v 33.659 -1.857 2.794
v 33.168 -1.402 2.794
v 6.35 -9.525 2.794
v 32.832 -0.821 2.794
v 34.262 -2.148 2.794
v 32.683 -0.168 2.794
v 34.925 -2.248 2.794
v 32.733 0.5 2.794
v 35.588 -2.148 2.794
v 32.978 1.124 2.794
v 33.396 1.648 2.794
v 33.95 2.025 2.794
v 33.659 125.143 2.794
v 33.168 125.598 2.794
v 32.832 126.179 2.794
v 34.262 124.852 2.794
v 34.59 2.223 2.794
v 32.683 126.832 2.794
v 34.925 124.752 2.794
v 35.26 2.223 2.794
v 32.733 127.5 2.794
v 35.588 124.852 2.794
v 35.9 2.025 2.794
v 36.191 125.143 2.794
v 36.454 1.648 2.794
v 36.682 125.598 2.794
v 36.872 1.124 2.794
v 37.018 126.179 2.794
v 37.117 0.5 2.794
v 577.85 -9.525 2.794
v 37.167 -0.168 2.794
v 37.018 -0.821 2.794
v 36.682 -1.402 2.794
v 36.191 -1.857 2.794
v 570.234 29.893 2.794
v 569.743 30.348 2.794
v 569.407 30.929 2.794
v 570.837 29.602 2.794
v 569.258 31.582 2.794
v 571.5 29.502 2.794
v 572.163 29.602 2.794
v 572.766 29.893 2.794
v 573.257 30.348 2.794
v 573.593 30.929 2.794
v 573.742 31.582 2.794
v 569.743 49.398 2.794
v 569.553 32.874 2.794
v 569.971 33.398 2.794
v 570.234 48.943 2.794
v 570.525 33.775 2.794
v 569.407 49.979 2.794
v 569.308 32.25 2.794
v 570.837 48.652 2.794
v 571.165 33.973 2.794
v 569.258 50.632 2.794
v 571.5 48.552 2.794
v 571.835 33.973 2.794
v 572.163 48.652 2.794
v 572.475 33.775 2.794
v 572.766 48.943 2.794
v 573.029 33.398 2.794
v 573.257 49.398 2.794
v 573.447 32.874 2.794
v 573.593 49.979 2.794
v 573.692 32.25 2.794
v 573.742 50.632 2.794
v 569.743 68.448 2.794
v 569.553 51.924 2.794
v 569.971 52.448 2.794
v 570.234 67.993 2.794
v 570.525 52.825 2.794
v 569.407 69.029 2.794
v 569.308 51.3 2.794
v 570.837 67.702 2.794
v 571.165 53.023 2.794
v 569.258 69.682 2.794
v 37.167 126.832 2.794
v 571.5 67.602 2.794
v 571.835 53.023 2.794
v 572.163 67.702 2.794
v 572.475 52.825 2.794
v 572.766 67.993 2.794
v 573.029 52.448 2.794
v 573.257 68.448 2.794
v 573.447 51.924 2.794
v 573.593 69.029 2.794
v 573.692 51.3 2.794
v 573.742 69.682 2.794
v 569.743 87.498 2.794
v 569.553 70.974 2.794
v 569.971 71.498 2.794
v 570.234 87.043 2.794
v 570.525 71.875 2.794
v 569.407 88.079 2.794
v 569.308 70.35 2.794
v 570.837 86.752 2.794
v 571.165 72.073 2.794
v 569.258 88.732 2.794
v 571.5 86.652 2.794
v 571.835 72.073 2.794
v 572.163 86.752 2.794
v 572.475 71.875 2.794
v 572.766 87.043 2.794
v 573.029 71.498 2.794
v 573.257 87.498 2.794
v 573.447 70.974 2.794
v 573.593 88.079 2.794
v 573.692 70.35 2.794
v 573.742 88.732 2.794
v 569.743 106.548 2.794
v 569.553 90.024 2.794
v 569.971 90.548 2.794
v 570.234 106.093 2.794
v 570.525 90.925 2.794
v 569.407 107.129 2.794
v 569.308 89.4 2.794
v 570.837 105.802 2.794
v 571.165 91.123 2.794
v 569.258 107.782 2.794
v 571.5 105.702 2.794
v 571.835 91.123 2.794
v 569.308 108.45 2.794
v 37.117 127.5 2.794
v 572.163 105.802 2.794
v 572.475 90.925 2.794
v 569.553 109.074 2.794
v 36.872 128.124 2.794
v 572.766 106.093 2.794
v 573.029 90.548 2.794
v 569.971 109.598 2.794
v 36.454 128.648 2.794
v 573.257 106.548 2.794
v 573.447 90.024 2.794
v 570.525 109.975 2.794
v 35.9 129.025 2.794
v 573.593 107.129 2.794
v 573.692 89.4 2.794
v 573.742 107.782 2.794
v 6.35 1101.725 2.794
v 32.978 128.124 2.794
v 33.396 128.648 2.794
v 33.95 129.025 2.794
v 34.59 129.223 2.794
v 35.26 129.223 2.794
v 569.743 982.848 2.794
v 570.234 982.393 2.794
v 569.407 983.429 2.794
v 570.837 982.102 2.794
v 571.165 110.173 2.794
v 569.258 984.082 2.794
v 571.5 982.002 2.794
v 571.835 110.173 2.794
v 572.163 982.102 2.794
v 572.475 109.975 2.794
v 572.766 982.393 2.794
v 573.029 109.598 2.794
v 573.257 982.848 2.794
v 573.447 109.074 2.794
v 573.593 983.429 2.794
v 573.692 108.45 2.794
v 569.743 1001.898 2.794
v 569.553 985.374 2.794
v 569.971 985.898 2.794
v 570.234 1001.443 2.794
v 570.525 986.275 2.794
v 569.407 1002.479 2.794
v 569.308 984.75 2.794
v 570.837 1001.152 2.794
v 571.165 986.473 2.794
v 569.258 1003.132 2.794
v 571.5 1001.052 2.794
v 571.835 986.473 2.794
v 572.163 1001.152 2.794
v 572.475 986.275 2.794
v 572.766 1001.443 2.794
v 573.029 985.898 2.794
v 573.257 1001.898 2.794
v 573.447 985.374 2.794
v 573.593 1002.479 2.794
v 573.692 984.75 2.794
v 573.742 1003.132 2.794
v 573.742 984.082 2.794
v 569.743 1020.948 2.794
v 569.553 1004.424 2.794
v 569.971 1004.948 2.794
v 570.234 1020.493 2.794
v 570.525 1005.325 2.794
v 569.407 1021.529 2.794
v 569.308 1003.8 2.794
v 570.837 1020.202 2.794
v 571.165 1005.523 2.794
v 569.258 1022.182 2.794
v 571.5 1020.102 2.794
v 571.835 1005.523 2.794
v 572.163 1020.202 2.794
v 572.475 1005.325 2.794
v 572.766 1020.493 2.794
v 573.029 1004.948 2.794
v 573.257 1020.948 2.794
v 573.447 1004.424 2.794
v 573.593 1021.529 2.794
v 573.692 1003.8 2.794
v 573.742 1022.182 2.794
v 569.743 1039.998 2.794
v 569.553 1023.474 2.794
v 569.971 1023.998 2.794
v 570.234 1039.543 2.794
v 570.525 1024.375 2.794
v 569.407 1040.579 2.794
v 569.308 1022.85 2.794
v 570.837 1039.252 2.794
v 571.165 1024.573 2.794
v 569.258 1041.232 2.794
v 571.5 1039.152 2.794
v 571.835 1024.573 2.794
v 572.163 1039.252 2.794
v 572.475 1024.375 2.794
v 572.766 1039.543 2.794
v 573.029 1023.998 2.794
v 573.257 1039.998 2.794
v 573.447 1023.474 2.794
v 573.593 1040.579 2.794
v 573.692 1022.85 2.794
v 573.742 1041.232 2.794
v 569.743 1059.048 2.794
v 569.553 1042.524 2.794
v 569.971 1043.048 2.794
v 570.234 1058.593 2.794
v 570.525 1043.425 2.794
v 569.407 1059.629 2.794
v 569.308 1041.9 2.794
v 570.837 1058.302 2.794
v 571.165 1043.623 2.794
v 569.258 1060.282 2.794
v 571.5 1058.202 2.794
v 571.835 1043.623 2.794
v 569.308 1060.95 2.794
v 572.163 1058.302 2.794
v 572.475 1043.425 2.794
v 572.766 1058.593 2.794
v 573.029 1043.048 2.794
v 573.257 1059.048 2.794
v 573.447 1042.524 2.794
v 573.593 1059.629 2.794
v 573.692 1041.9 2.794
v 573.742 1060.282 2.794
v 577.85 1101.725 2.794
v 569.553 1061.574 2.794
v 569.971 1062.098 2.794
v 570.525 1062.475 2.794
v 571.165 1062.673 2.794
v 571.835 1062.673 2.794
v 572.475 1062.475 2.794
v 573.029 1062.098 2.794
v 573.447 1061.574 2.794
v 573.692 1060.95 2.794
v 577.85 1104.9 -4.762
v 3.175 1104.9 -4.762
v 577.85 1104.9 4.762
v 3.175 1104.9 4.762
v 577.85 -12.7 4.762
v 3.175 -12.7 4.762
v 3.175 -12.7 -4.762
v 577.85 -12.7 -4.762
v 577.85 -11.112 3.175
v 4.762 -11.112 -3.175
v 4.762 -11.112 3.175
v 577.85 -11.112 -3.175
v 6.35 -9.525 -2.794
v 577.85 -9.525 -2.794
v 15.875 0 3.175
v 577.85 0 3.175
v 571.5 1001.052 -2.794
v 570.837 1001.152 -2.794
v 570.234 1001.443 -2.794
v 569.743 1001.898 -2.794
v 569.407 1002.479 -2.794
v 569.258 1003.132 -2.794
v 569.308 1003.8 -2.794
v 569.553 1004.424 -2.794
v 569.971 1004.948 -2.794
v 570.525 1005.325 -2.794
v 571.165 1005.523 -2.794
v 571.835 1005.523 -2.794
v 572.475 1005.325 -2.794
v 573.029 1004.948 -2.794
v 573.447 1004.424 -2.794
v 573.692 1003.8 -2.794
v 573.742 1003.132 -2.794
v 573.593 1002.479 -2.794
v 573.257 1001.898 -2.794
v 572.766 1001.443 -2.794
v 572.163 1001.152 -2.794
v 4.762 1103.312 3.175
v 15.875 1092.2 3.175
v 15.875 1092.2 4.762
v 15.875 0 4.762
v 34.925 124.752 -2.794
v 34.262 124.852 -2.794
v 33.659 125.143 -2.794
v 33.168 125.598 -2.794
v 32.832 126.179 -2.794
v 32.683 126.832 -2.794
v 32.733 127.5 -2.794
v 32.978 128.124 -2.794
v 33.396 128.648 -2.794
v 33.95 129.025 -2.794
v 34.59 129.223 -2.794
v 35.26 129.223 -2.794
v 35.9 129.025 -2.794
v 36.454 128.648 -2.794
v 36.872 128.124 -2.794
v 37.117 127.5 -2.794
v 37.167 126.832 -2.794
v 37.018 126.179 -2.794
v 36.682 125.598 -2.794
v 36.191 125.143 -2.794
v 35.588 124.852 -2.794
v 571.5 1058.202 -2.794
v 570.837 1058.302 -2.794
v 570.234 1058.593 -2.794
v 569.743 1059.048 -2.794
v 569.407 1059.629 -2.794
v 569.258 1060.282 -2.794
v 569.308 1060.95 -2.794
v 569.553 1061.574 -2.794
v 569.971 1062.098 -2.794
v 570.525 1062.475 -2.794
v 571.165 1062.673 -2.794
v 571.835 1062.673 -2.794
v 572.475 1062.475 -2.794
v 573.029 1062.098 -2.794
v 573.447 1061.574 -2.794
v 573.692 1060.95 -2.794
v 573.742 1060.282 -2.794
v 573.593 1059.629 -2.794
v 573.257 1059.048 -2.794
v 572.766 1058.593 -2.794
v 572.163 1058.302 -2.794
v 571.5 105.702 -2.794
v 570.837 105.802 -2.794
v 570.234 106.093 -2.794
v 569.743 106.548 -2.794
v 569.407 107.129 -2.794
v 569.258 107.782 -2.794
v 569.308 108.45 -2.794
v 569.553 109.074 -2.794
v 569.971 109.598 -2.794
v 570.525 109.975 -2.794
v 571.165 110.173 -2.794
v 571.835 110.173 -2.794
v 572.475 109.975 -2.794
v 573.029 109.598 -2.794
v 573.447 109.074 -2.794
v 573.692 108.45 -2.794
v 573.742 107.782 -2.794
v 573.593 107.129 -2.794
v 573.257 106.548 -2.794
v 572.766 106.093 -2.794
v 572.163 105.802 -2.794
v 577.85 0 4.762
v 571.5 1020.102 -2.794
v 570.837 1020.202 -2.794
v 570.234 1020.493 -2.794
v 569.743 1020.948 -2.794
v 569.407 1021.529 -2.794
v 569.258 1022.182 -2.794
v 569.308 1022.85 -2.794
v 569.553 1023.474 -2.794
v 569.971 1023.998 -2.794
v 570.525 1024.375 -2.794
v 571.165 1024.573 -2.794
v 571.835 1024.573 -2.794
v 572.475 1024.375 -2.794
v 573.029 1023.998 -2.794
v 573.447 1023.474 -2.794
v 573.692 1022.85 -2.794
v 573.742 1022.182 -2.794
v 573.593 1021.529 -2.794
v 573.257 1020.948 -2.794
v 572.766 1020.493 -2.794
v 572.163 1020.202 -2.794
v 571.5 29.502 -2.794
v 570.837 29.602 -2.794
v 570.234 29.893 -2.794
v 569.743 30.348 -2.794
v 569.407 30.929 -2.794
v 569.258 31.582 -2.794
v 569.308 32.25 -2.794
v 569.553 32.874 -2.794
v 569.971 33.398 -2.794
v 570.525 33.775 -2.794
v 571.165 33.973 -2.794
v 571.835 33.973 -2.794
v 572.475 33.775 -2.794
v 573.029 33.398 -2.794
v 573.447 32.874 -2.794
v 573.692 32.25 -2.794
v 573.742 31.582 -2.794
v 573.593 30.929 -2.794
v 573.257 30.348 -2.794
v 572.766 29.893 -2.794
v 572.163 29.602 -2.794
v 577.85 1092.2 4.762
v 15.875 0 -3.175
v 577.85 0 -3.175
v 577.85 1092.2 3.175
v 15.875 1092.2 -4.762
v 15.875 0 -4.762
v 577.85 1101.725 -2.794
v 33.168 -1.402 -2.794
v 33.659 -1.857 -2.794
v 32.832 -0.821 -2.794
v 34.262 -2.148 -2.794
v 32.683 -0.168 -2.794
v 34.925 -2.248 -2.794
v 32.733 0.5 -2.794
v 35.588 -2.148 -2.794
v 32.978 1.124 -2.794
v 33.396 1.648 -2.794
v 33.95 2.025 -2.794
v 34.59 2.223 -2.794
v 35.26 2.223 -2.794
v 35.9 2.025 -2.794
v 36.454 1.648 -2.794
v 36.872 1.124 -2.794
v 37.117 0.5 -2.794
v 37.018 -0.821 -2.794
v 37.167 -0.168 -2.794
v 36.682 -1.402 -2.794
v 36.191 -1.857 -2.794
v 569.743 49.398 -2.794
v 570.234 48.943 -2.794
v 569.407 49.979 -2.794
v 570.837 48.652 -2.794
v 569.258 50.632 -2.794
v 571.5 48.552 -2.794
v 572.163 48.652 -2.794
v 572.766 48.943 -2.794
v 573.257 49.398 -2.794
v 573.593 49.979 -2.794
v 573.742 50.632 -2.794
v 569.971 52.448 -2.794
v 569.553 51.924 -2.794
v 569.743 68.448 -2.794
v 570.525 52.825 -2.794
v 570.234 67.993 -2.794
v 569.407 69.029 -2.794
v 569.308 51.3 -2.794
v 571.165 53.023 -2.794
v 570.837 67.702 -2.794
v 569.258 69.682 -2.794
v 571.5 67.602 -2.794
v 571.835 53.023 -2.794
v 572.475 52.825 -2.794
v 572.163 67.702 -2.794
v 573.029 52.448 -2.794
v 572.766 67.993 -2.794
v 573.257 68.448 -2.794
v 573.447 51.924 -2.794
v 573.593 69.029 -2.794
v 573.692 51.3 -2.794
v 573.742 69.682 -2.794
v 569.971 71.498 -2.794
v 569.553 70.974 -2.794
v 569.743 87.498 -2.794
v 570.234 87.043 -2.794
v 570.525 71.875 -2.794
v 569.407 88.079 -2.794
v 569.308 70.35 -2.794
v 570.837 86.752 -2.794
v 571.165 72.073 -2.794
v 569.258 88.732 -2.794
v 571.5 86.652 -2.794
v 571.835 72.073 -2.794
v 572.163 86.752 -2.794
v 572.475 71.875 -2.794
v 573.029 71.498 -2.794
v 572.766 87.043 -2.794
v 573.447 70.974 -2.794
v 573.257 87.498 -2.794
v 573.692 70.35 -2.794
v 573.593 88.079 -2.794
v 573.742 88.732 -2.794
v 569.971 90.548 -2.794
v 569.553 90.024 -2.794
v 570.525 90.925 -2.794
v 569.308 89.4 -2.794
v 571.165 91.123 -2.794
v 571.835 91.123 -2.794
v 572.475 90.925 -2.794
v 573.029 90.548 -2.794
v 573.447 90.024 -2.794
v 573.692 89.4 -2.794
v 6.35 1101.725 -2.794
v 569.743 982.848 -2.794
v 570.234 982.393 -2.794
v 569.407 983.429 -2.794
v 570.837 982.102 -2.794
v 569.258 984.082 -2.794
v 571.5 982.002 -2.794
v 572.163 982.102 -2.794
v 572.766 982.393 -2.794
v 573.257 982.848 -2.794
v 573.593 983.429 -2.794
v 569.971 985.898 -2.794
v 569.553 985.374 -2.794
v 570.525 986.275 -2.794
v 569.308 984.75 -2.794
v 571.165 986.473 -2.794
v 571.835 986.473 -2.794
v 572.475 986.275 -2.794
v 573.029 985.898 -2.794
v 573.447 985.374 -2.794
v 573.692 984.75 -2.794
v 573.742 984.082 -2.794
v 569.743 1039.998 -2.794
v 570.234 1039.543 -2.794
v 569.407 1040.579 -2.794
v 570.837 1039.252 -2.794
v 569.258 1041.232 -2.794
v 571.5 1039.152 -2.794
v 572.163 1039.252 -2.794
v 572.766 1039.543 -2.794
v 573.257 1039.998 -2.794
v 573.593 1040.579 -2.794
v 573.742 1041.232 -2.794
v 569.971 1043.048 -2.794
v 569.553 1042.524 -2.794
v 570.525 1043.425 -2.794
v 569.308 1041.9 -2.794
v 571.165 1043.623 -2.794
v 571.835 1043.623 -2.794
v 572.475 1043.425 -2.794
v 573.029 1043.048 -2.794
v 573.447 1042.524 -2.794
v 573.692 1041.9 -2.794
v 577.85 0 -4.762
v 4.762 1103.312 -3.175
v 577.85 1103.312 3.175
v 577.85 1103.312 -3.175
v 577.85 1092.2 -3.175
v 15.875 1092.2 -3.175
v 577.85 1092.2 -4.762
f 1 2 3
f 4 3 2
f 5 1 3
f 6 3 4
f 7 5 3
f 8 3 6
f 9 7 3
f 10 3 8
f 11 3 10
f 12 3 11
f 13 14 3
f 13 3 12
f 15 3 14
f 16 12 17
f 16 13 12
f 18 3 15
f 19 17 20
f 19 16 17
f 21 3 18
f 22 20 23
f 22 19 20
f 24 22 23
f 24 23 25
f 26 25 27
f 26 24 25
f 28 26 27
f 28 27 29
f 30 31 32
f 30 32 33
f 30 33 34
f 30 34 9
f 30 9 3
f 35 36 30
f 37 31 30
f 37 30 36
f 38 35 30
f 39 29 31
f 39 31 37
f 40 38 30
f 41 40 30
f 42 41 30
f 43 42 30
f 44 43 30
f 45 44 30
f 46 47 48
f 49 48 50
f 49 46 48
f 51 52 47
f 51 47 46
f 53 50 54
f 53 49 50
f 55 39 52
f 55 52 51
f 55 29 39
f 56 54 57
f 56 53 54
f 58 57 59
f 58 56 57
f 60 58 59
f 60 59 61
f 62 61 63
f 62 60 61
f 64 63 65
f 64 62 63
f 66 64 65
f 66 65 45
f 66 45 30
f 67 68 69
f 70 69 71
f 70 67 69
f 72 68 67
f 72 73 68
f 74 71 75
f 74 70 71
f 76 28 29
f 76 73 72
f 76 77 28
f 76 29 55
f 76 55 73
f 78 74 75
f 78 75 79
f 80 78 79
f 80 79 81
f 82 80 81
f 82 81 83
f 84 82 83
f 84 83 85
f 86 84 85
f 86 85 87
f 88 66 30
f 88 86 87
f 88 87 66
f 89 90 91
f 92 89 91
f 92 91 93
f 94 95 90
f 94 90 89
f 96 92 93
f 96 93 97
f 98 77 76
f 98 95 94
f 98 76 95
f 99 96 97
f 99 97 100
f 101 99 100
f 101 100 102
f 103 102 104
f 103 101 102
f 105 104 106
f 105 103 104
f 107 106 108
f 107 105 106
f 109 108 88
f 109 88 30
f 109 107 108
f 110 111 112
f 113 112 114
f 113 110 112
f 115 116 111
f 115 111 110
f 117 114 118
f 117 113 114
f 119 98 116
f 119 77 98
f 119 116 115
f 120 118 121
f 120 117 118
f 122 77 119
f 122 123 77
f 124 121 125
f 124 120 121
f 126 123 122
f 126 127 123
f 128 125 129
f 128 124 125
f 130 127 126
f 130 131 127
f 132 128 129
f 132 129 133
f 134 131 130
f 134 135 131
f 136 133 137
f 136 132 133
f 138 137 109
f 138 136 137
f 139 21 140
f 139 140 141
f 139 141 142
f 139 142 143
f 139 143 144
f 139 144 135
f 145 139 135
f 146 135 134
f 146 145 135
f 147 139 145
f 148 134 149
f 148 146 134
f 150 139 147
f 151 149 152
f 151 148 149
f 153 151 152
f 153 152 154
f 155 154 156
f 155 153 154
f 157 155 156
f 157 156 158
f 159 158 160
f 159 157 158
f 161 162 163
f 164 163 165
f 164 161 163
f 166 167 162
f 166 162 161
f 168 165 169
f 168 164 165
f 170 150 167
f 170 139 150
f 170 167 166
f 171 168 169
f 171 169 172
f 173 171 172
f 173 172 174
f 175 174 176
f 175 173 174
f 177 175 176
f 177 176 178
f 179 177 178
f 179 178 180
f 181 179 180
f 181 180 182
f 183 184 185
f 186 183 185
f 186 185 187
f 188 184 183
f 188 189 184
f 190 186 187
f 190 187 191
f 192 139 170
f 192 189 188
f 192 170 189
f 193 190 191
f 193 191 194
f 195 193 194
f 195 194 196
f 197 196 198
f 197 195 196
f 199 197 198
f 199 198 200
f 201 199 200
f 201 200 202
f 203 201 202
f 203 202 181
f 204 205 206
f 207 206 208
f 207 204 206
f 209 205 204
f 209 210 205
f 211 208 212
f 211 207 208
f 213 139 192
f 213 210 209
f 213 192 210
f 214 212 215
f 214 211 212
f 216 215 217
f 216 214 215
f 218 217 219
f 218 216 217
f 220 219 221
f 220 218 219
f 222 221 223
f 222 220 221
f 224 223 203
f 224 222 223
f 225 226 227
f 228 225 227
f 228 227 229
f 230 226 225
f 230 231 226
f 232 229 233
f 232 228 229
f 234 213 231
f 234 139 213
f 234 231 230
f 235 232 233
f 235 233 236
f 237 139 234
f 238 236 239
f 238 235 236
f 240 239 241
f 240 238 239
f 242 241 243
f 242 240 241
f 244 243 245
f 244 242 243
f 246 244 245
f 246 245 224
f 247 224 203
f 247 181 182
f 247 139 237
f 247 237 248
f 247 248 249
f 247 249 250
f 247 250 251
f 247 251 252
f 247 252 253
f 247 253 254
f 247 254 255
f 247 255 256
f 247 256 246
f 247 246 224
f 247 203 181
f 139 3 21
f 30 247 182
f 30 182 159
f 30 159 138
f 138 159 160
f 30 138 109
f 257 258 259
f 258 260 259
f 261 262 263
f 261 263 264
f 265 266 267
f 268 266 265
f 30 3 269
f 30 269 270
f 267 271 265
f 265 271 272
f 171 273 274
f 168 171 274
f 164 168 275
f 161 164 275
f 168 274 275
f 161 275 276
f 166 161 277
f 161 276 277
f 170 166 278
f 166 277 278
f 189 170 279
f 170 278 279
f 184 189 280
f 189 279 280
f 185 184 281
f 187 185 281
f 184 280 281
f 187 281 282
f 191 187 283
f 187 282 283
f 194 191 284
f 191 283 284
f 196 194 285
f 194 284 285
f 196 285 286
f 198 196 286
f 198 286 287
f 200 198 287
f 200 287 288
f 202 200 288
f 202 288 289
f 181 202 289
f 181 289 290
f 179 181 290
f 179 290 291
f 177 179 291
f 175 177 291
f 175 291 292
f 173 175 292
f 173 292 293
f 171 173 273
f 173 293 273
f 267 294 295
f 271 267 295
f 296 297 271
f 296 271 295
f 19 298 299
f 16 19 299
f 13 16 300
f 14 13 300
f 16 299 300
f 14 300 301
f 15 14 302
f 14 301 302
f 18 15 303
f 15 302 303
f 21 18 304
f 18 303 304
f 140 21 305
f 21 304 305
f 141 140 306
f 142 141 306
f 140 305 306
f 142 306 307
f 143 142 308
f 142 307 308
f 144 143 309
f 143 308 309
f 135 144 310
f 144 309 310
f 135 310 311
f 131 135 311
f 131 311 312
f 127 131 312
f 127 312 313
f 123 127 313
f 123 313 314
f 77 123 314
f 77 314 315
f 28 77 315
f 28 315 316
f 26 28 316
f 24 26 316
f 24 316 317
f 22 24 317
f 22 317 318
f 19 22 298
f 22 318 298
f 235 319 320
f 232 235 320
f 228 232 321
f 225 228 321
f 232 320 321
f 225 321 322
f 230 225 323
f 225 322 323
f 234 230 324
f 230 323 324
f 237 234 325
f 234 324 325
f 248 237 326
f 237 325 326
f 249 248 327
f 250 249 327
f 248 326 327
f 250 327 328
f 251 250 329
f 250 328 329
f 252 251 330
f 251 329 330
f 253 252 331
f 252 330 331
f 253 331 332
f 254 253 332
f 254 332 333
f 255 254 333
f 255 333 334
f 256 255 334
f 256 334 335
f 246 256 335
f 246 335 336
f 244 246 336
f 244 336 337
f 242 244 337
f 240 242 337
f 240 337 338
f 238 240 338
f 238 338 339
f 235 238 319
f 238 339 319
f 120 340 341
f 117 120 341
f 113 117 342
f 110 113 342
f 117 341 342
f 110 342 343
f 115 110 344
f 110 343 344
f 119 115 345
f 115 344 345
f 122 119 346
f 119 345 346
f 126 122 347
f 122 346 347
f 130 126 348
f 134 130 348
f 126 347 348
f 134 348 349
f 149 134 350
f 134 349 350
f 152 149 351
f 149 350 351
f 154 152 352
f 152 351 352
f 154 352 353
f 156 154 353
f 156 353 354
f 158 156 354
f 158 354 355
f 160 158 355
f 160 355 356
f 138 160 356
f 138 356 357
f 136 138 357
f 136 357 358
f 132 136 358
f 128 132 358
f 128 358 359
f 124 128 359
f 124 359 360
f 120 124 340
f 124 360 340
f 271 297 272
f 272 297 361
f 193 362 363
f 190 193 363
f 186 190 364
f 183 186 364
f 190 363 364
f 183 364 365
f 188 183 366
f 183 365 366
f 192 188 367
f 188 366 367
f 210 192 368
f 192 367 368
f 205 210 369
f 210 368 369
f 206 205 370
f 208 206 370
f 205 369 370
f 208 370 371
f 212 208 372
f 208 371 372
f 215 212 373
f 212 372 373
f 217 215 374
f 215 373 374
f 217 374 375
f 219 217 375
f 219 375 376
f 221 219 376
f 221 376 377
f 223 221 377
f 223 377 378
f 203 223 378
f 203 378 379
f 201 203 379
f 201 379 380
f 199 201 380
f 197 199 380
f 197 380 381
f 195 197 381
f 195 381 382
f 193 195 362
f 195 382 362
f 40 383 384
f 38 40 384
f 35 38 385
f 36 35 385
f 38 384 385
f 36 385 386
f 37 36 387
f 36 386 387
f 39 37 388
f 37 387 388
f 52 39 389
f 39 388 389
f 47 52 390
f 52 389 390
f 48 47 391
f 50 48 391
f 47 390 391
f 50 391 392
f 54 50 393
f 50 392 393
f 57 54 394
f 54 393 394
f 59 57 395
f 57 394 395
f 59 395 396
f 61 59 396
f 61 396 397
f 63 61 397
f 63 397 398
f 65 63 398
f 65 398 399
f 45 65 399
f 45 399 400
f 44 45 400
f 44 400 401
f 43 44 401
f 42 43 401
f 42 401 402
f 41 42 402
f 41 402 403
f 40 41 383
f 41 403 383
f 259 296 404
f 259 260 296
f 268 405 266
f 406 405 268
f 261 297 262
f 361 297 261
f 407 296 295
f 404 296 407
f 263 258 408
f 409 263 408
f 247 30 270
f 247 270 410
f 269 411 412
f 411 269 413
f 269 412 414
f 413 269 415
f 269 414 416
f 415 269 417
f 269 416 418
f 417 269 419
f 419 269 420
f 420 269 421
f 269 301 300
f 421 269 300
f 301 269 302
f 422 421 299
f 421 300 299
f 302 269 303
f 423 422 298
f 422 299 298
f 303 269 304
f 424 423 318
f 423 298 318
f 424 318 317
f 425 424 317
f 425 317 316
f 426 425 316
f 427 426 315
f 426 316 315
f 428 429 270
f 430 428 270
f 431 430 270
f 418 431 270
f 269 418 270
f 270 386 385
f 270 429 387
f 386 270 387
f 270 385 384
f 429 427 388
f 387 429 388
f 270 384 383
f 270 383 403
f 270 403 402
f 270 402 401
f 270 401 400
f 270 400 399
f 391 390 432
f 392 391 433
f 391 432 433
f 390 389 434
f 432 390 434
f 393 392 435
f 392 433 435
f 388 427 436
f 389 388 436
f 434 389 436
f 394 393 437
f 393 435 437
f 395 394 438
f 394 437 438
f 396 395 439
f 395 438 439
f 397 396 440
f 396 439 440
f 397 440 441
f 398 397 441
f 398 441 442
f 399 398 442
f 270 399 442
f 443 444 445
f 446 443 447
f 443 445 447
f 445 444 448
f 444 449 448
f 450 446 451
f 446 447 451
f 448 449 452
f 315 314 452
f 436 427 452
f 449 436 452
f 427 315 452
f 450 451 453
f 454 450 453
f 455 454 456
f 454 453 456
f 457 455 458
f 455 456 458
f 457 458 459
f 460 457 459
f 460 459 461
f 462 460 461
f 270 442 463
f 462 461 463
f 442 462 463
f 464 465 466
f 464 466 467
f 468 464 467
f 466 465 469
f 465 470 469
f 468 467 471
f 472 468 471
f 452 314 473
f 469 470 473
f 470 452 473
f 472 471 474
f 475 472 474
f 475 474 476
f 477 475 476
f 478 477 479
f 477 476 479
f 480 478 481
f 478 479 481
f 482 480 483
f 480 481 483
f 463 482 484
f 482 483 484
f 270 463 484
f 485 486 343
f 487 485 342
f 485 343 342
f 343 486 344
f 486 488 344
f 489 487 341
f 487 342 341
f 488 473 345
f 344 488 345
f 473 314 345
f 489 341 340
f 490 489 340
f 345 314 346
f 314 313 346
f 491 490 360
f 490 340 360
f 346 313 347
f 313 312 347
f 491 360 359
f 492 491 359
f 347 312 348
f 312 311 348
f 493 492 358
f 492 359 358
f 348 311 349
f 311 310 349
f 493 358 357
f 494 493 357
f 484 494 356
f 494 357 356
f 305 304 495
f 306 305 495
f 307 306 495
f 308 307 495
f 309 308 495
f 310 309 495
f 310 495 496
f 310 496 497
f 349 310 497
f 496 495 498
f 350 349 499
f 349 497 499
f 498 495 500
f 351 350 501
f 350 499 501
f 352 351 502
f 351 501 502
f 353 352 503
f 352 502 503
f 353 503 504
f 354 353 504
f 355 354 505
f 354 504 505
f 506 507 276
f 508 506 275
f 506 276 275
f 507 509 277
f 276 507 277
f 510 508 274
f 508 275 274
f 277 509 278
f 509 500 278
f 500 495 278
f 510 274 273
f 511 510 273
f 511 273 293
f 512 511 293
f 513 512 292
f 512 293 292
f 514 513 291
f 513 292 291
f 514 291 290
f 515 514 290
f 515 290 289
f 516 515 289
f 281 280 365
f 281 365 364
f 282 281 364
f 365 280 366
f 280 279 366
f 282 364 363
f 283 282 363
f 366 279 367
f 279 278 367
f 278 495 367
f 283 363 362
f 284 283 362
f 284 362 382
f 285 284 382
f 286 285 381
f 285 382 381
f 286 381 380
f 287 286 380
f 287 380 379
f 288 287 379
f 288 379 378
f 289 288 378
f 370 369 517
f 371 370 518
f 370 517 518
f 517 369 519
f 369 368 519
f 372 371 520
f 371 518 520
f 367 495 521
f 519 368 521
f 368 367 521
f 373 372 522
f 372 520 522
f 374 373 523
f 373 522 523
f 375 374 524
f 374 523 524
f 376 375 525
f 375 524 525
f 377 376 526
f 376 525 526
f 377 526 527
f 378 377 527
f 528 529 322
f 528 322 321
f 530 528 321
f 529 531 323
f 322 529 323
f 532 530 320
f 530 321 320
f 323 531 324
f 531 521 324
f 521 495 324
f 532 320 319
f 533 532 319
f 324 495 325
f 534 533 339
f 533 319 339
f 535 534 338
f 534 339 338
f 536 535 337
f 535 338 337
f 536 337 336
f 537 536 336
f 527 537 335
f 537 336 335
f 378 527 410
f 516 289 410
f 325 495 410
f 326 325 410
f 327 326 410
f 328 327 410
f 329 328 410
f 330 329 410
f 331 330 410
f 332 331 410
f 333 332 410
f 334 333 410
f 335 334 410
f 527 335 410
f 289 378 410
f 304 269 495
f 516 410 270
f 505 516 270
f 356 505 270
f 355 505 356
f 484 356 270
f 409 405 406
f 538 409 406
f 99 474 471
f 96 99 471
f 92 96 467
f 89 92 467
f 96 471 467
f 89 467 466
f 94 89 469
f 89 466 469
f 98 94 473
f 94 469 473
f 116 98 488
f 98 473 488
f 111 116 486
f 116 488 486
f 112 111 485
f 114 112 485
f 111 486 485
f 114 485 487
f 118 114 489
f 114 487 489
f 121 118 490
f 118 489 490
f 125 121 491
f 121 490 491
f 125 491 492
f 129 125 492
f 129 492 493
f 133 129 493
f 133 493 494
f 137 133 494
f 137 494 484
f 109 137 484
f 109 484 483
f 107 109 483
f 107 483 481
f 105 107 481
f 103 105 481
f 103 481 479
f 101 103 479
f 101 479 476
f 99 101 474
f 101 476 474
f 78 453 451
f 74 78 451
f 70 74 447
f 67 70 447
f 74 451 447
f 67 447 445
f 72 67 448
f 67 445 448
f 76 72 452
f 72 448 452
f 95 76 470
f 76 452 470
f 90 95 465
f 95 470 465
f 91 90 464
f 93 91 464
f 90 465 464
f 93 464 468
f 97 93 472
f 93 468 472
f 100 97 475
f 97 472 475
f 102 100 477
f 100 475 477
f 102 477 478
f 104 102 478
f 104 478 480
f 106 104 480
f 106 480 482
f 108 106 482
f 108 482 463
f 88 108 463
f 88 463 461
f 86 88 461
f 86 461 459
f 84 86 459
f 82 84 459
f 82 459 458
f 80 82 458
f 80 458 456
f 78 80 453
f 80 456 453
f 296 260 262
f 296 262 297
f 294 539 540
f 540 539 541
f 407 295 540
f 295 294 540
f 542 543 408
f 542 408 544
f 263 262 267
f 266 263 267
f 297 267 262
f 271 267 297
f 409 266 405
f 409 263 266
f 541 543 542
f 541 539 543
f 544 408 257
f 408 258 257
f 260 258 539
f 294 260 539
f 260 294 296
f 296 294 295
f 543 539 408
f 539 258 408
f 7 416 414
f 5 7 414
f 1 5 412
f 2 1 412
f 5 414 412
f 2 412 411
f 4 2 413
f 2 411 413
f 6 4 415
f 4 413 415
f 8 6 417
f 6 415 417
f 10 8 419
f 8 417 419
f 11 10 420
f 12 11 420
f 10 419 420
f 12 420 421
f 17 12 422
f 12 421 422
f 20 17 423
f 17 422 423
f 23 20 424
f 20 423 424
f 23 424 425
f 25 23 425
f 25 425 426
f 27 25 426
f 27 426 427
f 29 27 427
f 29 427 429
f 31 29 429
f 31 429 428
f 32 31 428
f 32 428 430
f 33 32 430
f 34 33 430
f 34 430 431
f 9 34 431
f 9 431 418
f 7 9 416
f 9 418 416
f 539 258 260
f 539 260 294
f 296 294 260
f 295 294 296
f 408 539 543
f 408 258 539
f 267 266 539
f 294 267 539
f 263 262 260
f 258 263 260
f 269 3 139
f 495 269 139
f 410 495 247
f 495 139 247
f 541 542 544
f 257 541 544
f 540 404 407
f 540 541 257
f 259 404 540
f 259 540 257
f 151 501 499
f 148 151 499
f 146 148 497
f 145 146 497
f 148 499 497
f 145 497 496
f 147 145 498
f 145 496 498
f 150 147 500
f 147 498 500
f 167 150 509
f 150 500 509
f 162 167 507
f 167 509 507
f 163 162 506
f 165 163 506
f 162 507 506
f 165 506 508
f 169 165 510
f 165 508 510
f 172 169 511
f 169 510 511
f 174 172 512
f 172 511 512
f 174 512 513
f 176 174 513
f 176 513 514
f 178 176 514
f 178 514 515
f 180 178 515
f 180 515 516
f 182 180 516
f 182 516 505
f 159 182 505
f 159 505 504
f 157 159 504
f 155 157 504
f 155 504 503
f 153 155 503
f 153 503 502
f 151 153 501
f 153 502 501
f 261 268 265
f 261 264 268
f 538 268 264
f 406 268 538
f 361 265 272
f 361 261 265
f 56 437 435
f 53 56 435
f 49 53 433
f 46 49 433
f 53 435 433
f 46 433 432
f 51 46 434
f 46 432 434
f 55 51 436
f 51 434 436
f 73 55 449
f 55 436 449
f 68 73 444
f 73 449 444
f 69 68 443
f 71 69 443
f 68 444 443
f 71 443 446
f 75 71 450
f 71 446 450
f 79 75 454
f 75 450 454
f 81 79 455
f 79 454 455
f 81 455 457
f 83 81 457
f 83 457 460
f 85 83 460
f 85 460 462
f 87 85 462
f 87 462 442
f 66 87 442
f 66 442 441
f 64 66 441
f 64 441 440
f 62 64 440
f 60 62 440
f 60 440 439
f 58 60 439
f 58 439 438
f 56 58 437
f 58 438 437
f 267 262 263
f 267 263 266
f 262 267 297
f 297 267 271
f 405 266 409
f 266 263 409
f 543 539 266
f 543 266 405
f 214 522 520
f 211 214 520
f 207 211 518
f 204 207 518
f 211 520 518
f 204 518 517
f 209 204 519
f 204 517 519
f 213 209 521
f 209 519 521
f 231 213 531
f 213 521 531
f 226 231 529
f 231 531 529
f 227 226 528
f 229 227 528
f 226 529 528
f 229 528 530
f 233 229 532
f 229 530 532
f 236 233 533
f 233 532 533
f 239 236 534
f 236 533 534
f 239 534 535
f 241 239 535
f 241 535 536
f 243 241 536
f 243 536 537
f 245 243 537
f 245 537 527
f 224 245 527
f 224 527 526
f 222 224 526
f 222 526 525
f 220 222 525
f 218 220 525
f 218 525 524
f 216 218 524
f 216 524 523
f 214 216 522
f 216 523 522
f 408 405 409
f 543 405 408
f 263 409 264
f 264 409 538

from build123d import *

# Parameters (mm, degrees)
SKETCH2_W                             = 574.675
SKETCH2_H                             = 1117.6
FRAME_OUTER_DIMENSIONS_DEPTH          = 4.7625
SKETCH3_W                             = 561.975
SKETCH3_H                             = 1092.2
FRAME_INNER_DIMENSIONS_DEPTH          = 1247.91834461
FRAME_PROFILE_DEPTH                   = 3.175
FRAME_PROFILE_DEPTH_BACK              = 3.175
SKETCH4_W                             = 573.0875
SKETCH4_H                             = 1114.425
FRAME_SECTION_SPLIT_SURFACE_1_1_BACK  = 1257.731
FRAME_SECTION_SPLIT_SURFACE_1_1_DEPTH = 2515.462
FRAME_SECTION_SPLIT_SURFACE_1_2_BACK  = 1257.731
FRAME_SECTION_SPLIT_SURFACE_1_2_DEPTH = 2515.462
FRAME_SECTION_SPLIT_SURFACE_2_3_BACK  = 1257.731
FRAME_SECTION_SPLIT_SURFACE_2_3_DEPTH = 2515.462
FRAME_SECTION_SPLIT_SURFACE_2_4_BACK  = 1257.731
FRAME_SECTION_SPLIT_SURFACE_2_4_DEPTH = 2515.462
SKETCH5_W                             = 571.5
SKETCH5_H                             = 1111.25
DOOR_PANEL_DEPTH                      = 2.794
SKETCH9_W                             = 2.2479
SKETCH9_H                             = 7.5565
F_8_CLEARANCE_HOLE1_AT_2_COUNT        = 2
F_8_CLEARANCE_HOLE1_AT_2_PITCH        = 19.05
F_8_CLEARANCE_HOLE1_AT_3_COUNT        = 2
F_8_CLEARANCE_HOLE1_AT_3_PITCH        = 38.1
F_8_CLEARANCE_HOLE1_AT_4_COUNT        = 2
F_8_CLEARANCE_HOLE1_AT_4_PITCH        = 57.15
F_8_CLEARANCE_HOLE1_AT_5_COUNT        = 2
F_8_CLEARANCE_HOLE1_AT_5_PITCH        = 76.2
F_8_CLEARANCE_HOLE1_AT_6_COUNT        = 2
F_8_CLEARANCE_HOLE1_AT_6_PITCH        = 971.55
F_8_CLEARANCE_HOLE1_AT_7_COUNT        = 2
F_8_CLEARANCE_HOLE1_AT_7_PITCH        = 990.6
F_8_CLEARANCE_HOLE1_AT_8_COUNT        = 2
F_8_CLEARANCE_HOLE1_AT_8_PITCH        = 1009.65
F_8_CLEARANCE_HOLE1_AT_9_COUNT        = 2
F_8_CLEARANCE_HOLE1_AT_9_PITCH        = 1028.7
F_8_CLEARANCE_HOLE1_AT_10_COUNT       = 2
F_8_CLEARANCE_HOLE1_AT_10_PITCH       = 952.5
SKETCH12_W                            = 2.2479
SKETCH12_H                            = 7.5565
F_8_CLEARANCE_HOLE2_AT_2_COUNT        = 2
F_8_CLEARANCE_HOLE2_AT_2_PITCH        = 127


with BuildPart() as part:
    # Sketch2 → Frame outer dimensions (new, symmetric)
    with BuildSketch(Plane.XY):
        with Locations((290.5125, 546.1)):
            Rectangle(SKETCH2_W, SKETCH2_H)
    extrude(amount=FRAME_OUTER_DIMENSIONS_DEPTH, both=True)

    # Sketch3 → Frame inner dimensions (cut, through all)
    with BuildSketch(Plane.XY.offset(4.7625)):
        with Locations((296.8625, 546.1)):
            Rectangle(SKETCH3_W, SKETCH3_H)
    extrude(amount=-FRAME_INNER_DIMENSIONS_DEPTH, mode=Mode.SUBTRACT)

    # Sketch4 → Frame profile (cut, two sides: drawn at the far end of the back side and taken through both)
    with BuildSketch(Plane.XY.offset(-FRAME_PROFILE_DEPTH_BACK)):
        with Locations((291.30625, 546.1)):
            Rectangle(SKETCH4_W, SKETCH4_H)
    extrude(amount=FRAME_PROFILE_DEPTH + FRAME_PROFILE_DEPTH_BACK, mode=Mode.SUBTRACT)


with BuildPart() as body_2:
    # Frame section split: the piece behind the surface
    add(part.part)
    # Frame section split surface 1: a surface, the sketch's curves swept straight by 2515.462 mm
    with BuildLine(Plane.XY.offset(4.7625).offset(-FRAME_SECTION_SPLIT_SURFACE_1_1_BACK), mode=Mode.PRIVATE) as frame_section_split_surface_1_1_path:
        Line((3.175, 1104.9), (15.875, 1092.2))
    frame_section_split_surface_1_1 = Shell.extrude(frame_section_split_surface_1_1_path.wire(), (0 * FRAME_SECTION_SPLIT_SURFACE_1_1_DEPTH, 0 * FRAME_SECTION_SPLIT_SURFACE_1_1_DEPTH, 1 * FRAME_SECTION_SPLIT_SURFACE_1_1_DEPTH))
    split(bisect_by=frame_section_split_surface_1_1, keep=Keep.BOTTOM)


with BuildPart() as part_1:
    add(part.part)

    # Frame section split: split by a surface, the side it looks to stays
    # Frame section split surface 1: a surface, the sketch's curves swept straight by 2515.462 mm
    with BuildLine(Plane.XY.offset(4.7625).offset(-FRAME_SECTION_SPLIT_SURFACE_1_2_BACK), mode=Mode.PRIVATE) as frame_section_split_surface_1_2_path:
        Line((3.175, 1104.9), (15.875, 1092.2))
    frame_section_split_surface_1_2 = Shell.extrude(frame_section_split_surface_1_2_path.wire(), (0 * FRAME_SECTION_SPLIT_SURFACE_1_2_DEPTH, 0 * FRAME_SECTION_SPLIT_SURFACE_1_2_DEPTH, 1 * FRAME_SECTION_SPLIT_SURFACE_1_2_DEPTH))
    split(bisect_by=frame_section_split_surface_1_2, keep=Keep.TOP)


with BuildPart() as body_3:
    # Frame section split 2 body 2: the piece behind the surface
    add(body_2.part)
    # Frame section split surface 2: a surface, the sketch's curves swept straight by 2515.462 mm
    with BuildLine(Plane.XY.offset(4.7625).offset(-FRAME_SECTION_SPLIT_SURFACE_2_3_BACK), mode=Mode.PRIVATE) as frame_section_split_surface_2_3_path:
        Line((3.175, -12.7), (15.875, 0))
    frame_section_split_surface_2_3 = Shell.extrude(frame_section_split_surface_2_3_path.wire(), (0 * FRAME_SECTION_SPLIT_SURFACE_2_3_DEPTH, 0 * FRAME_SECTION_SPLIT_SURFACE_2_3_DEPTH, 1 * FRAME_SECTION_SPLIT_SURFACE_2_3_DEPTH))
    split(bisect_by=frame_section_split_surface_2_3, keep=Keep.BOTTOM)


with BuildPart() as body_2_1:
    add(body_2.part)

    # Frame section split 2 body 2: split by a surface, the side it looks to stays
    # Frame section split surface 2: a surface, the sketch's curves swept straight by 2515.462 mm
    with BuildLine(Plane.XY.offset(4.7625).offset(-FRAME_SECTION_SPLIT_SURFACE_2_4_BACK), mode=Mode.PRIVATE) as frame_section_split_surface_2_4_path:
        Line((3.175, -12.7), (15.875, 0))
    frame_section_split_surface_2_4 = Shell.extrude(frame_section_split_surface_2_4_path.wire(), (0 * FRAME_SECTION_SPLIT_SURFACE_2_4_DEPTH, 0 * FRAME_SECTION_SPLIT_SURFACE_2_4_DEPTH, 1 * FRAME_SECTION_SPLIT_SURFACE_2_4_DEPTH))
    split(bisect_by=frame_section_split_surface_2_4, keep=Keep.TOP)


with BuildPart() as body_4:
    # Sketch5 → Door panel (new, symmetric)
    with BuildSketch(Plane.XY):
        with Locations((292.1, 546.1)):
            Rectangle(SKETCH5_W, SKETCH5_H)
    extrude(amount=DOOR_PANEL_DEPTH, both=True)

    # Sketch9 → #8 Clearance Hole1 (revolve, cut)
    with BuildSketch(Plane(origin=(571.5, 31.75, 2.794), x_dir=(0, -1, 0), z_dir=(1, 0, 0))):
        with Locations((1.12395, 3.77825)):
            Rectangle(SKETCH9_W, SKETCH9_H)
    f_8_clearance_hole1 = revolve(axis=Axis((571.5, 31.75, 9.144), (0, 0, -1)), mode=Mode.SUBTRACT)

    # #8 Clearance Hole1 at 2: #8 Clearance Hole1 ×2
    with Locations(*[(0, i * F_8_CLEARANCE_HOLE1_AT_2_PITCH, 0) for i in range(1, F_8_CLEARANCE_HOLE1_AT_2_COUNT)]):
        add(f_8_clearance_hole1, mode=Mode.SUBTRACT)

    # #8 Clearance Hole1 at 3: #8 Clearance Hole1 ×2
    with Locations(*[(0, i * F_8_CLEARANCE_HOLE1_AT_3_PITCH, 0) for i in range(1, F_8_CLEARANCE_HOLE1_AT_3_COUNT)]):
        add(f_8_clearance_hole1, mode=Mode.SUBTRACT)

    # #8 Clearance Hole1 at 4: #8 Clearance Hole1 ×2
    with Locations(*[(0, i * F_8_CLEARANCE_HOLE1_AT_4_PITCH, 0) for i in range(1, F_8_CLEARANCE_HOLE1_AT_4_COUNT)]):
        add(f_8_clearance_hole1, mode=Mode.SUBTRACT)

    # #8 Clearance Hole1 at 5: #8 Clearance Hole1 ×2
    with Locations(*[(0, i * F_8_CLEARANCE_HOLE1_AT_5_PITCH, 0) for i in range(1, F_8_CLEARANCE_HOLE1_AT_5_COUNT)]):
        add(f_8_clearance_hole1, mode=Mode.SUBTRACT)

    # #8 Clearance Hole1 at 6: #8 Clearance Hole1 ×2
    with Locations(*[(0, i * F_8_CLEARANCE_HOLE1_AT_6_PITCH, 0) for i in range(1, F_8_CLEARANCE_HOLE1_AT_6_COUNT)]):
        add(f_8_clearance_hole1, mode=Mode.SUBTRACT)

    # #8 Clearance Hole1 at 7: #8 Clearance Hole1 ×2
    with Locations(*[(0, i * F_8_CLEARANCE_HOLE1_AT_7_PITCH, 0) for i in range(1, F_8_CLEARANCE_HOLE1_AT_7_COUNT)]):
        add(f_8_clearance_hole1, mode=Mode.SUBTRACT)

    # #8 Clearance Hole1 at 8: #8 Clearance Hole1 ×2
    with Locations(*[(0, i * F_8_CLEARANCE_HOLE1_AT_8_PITCH, 0) for i in range(1, F_8_CLEARANCE_HOLE1_AT_8_COUNT)]):
        add(f_8_clearance_hole1, mode=Mode.SUBTRACT)

    # #8 Clearance Hole1 at 9: #8 Clearance Hole1 ×2
    with Locations(*[(0, i * F_8_CLEARANCE_HOLE1_AT_9_PITCH, 0) for i in range(1, F_8_CLEARANCE_HOLE1_AT_9_COUNT)]):
        add(f_8_clearance_hole1, mode=Mode.SUBTRACT)

    # #8 Clearance Hole1 at 10: #8 Clearance Hole1 ×2
    with Locations(*[(0, i * F_8_CLEARANCE_HOLE1_AT_10_PITCH, 0) for i in range(1, F_8_CLEARANCE_HOLE1_AT_10_COUNT)]):
        add(f_8_clearance_hole1, mode=Mode.SUBTRACT)

    # Sketch12 → #8 Clearance Hole2 (revolve, cut)
    with BuildSketch(Plane(origin=(34.925, 0, 2.794), x_dir=(0, -1, 0), z_dir=(1, 0, 0))):
        with Locations((1.12395, 3.77825)):
            Rectangle(SKETCH12_W, SKETCH12_H)
    f_8_clearance_hole2 = revolve(axis=Axis((34.925, 0, 9.144), (0, 0, -1)), mode=Mode.SUBTRACT)

    # #8 Clearance Hole2 at 2: #8 Clearance Hole2 ×2
    with Locations(*[(0, i * F_8_CLEARANCE_HOLE2_AT_2_PITCH, 0) for i in range(1, F_8_CLEARANCE_HOLE2_AT_2_COUNT)]):
        add(f_8_clearance_hole2, mode=Mode.SUBTRACT)


with BuildPart() as body_5:
    # Mirror1: mirrored copy
    add(part_1.part.mirror(Plane(origin=(0, 0, 0), x_dir=(0, 0, 1), z_dir=(1, 0, 0))))


with BuildPart() as body_6:
    # Mirror1 2: mirrored copy
    add(body_2_1.part.mirror(Plane(origin=(0, 0, 0), x_dir=(0, 0, 1), z_dir=(1, 0, 0))))


with BuildPart() as body_7:
    # Mirror1 3: mirrored copy
    add(body_3.part.mirror(Plane(origin=(0, 0, 0), x_dir=(0, 0, 1), z_dir=(1, 0, 0))))


with BuildPart() as body_8:
    # Mirror1 4: mirrored copy
    add(body_4.part.mirror(Plane(origin=(0, 0, 0), x_dir=(0, 0, 1), z_dir=(1, 0, 0))))


solid = Compound([part_1.part, body_3.part, body_2_1.part, body_4.part])
